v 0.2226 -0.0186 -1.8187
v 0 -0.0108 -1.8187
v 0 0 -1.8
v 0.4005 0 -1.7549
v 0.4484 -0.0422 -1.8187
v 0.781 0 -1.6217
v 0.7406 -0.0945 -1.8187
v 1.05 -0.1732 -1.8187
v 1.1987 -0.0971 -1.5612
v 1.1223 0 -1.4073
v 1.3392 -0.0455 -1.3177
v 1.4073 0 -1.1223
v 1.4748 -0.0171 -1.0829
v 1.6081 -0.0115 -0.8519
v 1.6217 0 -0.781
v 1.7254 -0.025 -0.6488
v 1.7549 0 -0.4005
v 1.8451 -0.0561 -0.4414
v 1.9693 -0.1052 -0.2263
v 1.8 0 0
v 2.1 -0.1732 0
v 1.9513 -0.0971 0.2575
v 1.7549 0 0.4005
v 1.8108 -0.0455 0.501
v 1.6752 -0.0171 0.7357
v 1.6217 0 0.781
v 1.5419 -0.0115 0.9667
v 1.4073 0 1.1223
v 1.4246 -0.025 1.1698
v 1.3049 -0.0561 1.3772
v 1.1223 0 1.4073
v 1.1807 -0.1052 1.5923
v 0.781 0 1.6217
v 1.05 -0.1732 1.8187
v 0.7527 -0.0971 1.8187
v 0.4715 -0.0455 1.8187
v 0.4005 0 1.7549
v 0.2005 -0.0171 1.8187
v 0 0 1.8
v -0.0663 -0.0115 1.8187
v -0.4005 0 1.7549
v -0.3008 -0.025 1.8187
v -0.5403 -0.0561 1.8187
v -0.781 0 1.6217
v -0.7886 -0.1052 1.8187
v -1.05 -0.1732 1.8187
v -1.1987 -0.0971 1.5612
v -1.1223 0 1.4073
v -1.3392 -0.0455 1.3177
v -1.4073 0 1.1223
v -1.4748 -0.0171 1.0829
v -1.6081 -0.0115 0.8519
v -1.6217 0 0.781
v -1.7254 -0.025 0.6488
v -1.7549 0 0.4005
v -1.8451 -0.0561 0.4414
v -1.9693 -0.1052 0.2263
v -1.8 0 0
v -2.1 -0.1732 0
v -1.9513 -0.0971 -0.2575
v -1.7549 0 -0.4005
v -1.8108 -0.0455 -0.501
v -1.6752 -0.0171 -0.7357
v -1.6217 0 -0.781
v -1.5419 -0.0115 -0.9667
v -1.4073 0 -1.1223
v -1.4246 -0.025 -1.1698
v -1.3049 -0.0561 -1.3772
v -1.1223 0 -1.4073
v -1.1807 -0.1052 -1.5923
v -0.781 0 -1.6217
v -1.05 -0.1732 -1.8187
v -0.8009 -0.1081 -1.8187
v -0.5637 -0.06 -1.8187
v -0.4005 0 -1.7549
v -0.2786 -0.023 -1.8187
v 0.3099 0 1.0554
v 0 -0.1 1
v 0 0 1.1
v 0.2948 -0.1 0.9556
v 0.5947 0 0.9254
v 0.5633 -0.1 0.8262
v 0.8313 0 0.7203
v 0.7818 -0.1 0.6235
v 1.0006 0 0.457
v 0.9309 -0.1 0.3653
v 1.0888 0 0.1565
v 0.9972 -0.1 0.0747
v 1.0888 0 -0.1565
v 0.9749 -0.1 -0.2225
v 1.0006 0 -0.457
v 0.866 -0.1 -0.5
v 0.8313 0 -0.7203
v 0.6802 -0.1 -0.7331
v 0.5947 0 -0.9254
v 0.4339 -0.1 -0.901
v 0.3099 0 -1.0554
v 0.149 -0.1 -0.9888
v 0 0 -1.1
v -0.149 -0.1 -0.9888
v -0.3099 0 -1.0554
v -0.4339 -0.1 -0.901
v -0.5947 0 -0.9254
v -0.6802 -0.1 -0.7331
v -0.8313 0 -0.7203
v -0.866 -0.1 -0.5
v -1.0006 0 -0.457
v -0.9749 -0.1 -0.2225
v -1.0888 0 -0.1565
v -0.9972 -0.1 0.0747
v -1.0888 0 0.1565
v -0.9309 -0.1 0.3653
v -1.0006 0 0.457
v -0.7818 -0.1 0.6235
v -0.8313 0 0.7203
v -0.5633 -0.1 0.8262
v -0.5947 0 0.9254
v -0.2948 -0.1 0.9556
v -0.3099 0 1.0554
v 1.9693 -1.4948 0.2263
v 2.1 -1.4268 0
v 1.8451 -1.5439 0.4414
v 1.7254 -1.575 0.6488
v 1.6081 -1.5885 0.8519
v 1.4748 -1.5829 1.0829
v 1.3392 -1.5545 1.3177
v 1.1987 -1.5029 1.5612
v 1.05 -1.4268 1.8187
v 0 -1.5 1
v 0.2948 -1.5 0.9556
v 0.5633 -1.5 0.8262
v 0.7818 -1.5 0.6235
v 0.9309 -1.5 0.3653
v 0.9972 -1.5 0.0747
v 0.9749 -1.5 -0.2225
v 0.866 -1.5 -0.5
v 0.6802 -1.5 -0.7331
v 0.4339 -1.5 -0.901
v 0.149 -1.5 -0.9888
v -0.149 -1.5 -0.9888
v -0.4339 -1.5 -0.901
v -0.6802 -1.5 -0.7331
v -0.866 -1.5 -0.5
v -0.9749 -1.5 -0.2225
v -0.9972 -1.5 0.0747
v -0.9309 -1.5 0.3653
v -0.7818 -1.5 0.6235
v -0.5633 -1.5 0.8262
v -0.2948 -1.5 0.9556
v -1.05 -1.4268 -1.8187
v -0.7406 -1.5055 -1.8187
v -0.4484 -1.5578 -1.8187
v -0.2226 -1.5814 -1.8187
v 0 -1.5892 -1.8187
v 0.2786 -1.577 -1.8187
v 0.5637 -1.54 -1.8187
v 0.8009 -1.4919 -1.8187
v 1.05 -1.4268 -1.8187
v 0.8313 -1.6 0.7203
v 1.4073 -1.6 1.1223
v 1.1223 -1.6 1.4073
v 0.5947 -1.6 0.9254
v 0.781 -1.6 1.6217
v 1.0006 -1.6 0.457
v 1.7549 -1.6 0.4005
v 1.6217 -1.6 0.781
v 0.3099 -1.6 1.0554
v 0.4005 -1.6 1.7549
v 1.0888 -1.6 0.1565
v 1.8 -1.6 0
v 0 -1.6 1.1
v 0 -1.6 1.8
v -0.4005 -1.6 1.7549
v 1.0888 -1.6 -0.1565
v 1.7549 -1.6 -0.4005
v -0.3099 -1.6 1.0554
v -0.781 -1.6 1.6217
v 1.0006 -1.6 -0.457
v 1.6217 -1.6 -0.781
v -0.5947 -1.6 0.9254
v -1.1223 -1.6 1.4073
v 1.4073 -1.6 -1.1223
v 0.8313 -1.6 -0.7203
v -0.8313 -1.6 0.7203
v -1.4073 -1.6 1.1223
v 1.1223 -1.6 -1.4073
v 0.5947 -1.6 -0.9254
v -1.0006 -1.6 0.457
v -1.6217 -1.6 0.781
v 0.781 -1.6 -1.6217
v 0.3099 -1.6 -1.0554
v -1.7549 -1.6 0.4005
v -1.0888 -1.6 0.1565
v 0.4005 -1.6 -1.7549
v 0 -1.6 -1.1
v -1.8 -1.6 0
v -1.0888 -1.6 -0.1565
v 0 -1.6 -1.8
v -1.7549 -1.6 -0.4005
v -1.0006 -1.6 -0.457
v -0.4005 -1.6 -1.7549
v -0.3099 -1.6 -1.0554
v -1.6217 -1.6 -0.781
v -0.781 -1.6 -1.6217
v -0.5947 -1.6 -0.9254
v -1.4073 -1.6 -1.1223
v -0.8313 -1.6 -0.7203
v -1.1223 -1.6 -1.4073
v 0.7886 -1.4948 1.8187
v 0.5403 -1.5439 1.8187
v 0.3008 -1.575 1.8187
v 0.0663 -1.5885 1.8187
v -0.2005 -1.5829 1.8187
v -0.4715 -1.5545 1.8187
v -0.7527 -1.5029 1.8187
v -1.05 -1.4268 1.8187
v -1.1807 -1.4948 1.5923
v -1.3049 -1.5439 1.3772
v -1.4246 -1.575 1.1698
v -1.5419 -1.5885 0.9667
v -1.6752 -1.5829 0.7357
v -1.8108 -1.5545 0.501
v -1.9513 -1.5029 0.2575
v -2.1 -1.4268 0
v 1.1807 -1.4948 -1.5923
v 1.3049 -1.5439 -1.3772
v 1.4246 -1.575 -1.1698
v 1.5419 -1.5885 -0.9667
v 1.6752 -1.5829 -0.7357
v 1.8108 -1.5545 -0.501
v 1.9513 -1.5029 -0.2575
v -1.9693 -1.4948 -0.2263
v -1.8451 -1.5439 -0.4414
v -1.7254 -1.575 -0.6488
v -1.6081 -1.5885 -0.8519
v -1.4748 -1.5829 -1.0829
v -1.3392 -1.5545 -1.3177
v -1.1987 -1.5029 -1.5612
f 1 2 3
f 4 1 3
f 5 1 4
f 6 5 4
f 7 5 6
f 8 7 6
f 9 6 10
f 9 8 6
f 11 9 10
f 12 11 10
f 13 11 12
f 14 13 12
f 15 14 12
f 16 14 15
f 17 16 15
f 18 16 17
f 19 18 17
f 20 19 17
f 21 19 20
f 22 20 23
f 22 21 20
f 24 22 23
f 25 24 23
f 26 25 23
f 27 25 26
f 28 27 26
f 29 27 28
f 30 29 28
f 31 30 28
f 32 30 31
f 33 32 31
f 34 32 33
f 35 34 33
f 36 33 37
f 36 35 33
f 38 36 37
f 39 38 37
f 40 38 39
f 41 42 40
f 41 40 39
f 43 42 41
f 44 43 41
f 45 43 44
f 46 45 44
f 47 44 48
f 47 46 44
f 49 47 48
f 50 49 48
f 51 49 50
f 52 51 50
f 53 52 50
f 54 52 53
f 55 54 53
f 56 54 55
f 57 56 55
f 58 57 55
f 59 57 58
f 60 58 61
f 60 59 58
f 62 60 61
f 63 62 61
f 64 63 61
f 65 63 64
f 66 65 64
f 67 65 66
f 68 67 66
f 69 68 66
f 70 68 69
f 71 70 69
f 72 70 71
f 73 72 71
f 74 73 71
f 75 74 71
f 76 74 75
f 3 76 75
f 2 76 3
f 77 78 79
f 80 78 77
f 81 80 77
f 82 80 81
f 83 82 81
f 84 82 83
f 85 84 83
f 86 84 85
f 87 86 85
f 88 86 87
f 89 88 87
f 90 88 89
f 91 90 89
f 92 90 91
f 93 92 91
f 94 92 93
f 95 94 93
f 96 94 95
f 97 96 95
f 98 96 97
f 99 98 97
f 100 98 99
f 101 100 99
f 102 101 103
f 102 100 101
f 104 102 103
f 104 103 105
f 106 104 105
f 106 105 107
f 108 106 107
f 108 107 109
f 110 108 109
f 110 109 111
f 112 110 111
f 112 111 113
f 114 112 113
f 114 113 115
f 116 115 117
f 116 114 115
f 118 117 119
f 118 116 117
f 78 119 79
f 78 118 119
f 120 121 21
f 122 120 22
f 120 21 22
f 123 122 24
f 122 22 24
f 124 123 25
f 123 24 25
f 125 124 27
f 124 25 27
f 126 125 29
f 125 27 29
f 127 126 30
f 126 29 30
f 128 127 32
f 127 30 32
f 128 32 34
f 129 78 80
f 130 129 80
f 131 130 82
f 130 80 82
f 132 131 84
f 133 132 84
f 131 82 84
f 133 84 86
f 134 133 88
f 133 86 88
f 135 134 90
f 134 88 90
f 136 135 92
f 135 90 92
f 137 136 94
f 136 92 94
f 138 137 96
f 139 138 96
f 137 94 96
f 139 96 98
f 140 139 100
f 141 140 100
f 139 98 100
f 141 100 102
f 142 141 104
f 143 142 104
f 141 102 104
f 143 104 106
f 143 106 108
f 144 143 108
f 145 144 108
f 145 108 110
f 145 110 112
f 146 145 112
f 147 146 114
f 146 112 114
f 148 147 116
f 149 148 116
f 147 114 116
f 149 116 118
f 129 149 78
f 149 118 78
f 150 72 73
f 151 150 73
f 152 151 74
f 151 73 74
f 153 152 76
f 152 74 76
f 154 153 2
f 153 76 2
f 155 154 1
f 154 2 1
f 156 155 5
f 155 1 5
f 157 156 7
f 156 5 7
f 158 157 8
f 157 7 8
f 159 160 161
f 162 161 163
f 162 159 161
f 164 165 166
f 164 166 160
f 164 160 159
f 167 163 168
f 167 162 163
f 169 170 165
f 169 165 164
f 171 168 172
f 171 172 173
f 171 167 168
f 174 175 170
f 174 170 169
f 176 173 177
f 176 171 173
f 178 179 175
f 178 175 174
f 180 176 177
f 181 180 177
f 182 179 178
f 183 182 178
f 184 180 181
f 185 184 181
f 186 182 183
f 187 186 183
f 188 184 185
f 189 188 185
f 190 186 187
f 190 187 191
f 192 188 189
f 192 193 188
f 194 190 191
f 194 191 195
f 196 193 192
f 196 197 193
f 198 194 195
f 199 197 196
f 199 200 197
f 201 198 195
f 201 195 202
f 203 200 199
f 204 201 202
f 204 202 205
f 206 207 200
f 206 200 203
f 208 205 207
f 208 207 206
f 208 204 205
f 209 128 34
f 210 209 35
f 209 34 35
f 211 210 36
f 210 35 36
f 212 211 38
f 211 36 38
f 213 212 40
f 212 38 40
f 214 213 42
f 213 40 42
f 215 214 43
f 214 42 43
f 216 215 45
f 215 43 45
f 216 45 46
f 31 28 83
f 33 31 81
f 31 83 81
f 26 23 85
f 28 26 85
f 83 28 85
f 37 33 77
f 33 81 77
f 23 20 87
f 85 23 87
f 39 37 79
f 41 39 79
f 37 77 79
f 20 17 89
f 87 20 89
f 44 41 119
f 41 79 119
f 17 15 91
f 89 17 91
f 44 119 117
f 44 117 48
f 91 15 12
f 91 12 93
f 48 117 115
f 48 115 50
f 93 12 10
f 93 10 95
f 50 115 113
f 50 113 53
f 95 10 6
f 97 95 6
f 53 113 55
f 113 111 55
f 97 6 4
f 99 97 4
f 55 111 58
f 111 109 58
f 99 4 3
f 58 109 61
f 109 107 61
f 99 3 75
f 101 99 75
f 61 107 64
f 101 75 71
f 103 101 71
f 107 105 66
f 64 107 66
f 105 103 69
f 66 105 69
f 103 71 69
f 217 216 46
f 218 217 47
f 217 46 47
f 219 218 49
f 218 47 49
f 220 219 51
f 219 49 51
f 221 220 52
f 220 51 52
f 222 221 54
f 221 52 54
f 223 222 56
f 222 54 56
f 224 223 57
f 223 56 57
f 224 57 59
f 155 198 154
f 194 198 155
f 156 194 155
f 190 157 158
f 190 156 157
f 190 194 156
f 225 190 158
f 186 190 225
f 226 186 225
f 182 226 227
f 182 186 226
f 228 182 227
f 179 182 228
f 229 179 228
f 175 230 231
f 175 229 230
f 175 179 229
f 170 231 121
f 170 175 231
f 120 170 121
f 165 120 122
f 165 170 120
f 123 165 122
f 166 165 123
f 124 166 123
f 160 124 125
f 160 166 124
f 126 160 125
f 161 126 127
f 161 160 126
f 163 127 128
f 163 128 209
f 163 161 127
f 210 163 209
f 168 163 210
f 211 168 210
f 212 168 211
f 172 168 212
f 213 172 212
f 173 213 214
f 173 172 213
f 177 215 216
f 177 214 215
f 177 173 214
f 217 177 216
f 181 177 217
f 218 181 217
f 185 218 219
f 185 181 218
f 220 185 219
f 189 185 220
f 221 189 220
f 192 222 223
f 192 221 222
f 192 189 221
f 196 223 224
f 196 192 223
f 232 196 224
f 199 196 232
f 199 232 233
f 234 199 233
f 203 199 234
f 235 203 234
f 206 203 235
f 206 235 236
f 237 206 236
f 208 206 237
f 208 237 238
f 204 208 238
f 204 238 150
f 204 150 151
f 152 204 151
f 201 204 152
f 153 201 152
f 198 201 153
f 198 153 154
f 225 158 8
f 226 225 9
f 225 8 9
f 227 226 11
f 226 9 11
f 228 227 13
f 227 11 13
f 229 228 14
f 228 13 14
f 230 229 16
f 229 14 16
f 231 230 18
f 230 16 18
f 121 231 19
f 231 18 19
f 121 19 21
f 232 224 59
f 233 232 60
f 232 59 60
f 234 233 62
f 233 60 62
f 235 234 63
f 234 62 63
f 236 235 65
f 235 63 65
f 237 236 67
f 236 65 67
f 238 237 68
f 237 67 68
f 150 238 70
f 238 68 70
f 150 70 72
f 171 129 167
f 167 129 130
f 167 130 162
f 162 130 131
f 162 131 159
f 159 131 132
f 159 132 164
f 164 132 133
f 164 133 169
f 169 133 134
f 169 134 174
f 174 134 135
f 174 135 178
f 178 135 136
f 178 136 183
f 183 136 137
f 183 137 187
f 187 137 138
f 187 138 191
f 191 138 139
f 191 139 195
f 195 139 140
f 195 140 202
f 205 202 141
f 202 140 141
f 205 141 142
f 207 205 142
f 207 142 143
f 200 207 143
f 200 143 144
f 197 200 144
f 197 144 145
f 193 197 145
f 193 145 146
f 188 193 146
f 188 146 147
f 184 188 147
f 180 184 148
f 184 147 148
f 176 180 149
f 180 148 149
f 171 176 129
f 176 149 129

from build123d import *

# Parameters (mm, degrees)
EXTRUDE_1_DEPTH     = 1.6
SKETCH_2_R          = 1
CUT_EXTRUDE_1_DEPTH = 1.6
CHAMFER_1_SIZE      = 0.1


with BuildPart() as part:
    # Эскиз1 → Вытянуть1 (new body)
    with BuildSketch(Plane(origin=(0, 0, 0), x_dir=(1, 0, 0), z_dir=(0, 1, 0))):
        Polygon((-1.050000001, 1.81865335), (1.050000001, 1.81865335), (2.1, 4e-09), (1.049999996, -1.81865335), (-1.050000001, -1.81865335), (-2.100000002, 0), align=None)
    extrude(amount=-EXTRUDE_1_DEPTH)

    # Эскиз2 → Вырез-Вытянуть1 (cut)
    with BuildSketch(Plane(origin=(0, 0, 0), x_dir=(-1, 0, 0), z_dir=(0, 1, 0))):
        with Locations(Location((0, 0, 0), (0, 0, 90))):
            Circle(SKETCH_2_R)
    extrude(amount=-CUT_EXTRUDE_1_DEPTH, mode=Mode.SUBTRACT)

    # Фаска1
    chamfer_1_edges = [part.edges().sort_by_distance(p)[0] for p in [
        (0, -1.6, -1),
        (0, 0, -1),
    ]]
    chamfer(chamfer_1_edges, length=CHAMFER_1_SIZE)

    # Эскиз3 → Вырез-Повернуть1 (revolve, cut)
    with BuildSketch(Plane.XY, mode=Mode.PRIVATE) as cut_revolve_1_sk:
        Polygon((-1.8, 0), (-2.100000002, -0.173205082), (-2.100000002, 0), align=None)
        Polygon((-2.100000002, -1.6), (-2.100000002, -1.426794918), (-1.8, -1.6), align=None)
    revolve(cut_revolve_1_sk.sketch.rotate(Axis((0, 0, 0), (0, -1, 0)), 90), axis=Axis((0, 0, 0), (0, -1, 0)), mode=Mode.SUBTRACT)


solid = part.part
